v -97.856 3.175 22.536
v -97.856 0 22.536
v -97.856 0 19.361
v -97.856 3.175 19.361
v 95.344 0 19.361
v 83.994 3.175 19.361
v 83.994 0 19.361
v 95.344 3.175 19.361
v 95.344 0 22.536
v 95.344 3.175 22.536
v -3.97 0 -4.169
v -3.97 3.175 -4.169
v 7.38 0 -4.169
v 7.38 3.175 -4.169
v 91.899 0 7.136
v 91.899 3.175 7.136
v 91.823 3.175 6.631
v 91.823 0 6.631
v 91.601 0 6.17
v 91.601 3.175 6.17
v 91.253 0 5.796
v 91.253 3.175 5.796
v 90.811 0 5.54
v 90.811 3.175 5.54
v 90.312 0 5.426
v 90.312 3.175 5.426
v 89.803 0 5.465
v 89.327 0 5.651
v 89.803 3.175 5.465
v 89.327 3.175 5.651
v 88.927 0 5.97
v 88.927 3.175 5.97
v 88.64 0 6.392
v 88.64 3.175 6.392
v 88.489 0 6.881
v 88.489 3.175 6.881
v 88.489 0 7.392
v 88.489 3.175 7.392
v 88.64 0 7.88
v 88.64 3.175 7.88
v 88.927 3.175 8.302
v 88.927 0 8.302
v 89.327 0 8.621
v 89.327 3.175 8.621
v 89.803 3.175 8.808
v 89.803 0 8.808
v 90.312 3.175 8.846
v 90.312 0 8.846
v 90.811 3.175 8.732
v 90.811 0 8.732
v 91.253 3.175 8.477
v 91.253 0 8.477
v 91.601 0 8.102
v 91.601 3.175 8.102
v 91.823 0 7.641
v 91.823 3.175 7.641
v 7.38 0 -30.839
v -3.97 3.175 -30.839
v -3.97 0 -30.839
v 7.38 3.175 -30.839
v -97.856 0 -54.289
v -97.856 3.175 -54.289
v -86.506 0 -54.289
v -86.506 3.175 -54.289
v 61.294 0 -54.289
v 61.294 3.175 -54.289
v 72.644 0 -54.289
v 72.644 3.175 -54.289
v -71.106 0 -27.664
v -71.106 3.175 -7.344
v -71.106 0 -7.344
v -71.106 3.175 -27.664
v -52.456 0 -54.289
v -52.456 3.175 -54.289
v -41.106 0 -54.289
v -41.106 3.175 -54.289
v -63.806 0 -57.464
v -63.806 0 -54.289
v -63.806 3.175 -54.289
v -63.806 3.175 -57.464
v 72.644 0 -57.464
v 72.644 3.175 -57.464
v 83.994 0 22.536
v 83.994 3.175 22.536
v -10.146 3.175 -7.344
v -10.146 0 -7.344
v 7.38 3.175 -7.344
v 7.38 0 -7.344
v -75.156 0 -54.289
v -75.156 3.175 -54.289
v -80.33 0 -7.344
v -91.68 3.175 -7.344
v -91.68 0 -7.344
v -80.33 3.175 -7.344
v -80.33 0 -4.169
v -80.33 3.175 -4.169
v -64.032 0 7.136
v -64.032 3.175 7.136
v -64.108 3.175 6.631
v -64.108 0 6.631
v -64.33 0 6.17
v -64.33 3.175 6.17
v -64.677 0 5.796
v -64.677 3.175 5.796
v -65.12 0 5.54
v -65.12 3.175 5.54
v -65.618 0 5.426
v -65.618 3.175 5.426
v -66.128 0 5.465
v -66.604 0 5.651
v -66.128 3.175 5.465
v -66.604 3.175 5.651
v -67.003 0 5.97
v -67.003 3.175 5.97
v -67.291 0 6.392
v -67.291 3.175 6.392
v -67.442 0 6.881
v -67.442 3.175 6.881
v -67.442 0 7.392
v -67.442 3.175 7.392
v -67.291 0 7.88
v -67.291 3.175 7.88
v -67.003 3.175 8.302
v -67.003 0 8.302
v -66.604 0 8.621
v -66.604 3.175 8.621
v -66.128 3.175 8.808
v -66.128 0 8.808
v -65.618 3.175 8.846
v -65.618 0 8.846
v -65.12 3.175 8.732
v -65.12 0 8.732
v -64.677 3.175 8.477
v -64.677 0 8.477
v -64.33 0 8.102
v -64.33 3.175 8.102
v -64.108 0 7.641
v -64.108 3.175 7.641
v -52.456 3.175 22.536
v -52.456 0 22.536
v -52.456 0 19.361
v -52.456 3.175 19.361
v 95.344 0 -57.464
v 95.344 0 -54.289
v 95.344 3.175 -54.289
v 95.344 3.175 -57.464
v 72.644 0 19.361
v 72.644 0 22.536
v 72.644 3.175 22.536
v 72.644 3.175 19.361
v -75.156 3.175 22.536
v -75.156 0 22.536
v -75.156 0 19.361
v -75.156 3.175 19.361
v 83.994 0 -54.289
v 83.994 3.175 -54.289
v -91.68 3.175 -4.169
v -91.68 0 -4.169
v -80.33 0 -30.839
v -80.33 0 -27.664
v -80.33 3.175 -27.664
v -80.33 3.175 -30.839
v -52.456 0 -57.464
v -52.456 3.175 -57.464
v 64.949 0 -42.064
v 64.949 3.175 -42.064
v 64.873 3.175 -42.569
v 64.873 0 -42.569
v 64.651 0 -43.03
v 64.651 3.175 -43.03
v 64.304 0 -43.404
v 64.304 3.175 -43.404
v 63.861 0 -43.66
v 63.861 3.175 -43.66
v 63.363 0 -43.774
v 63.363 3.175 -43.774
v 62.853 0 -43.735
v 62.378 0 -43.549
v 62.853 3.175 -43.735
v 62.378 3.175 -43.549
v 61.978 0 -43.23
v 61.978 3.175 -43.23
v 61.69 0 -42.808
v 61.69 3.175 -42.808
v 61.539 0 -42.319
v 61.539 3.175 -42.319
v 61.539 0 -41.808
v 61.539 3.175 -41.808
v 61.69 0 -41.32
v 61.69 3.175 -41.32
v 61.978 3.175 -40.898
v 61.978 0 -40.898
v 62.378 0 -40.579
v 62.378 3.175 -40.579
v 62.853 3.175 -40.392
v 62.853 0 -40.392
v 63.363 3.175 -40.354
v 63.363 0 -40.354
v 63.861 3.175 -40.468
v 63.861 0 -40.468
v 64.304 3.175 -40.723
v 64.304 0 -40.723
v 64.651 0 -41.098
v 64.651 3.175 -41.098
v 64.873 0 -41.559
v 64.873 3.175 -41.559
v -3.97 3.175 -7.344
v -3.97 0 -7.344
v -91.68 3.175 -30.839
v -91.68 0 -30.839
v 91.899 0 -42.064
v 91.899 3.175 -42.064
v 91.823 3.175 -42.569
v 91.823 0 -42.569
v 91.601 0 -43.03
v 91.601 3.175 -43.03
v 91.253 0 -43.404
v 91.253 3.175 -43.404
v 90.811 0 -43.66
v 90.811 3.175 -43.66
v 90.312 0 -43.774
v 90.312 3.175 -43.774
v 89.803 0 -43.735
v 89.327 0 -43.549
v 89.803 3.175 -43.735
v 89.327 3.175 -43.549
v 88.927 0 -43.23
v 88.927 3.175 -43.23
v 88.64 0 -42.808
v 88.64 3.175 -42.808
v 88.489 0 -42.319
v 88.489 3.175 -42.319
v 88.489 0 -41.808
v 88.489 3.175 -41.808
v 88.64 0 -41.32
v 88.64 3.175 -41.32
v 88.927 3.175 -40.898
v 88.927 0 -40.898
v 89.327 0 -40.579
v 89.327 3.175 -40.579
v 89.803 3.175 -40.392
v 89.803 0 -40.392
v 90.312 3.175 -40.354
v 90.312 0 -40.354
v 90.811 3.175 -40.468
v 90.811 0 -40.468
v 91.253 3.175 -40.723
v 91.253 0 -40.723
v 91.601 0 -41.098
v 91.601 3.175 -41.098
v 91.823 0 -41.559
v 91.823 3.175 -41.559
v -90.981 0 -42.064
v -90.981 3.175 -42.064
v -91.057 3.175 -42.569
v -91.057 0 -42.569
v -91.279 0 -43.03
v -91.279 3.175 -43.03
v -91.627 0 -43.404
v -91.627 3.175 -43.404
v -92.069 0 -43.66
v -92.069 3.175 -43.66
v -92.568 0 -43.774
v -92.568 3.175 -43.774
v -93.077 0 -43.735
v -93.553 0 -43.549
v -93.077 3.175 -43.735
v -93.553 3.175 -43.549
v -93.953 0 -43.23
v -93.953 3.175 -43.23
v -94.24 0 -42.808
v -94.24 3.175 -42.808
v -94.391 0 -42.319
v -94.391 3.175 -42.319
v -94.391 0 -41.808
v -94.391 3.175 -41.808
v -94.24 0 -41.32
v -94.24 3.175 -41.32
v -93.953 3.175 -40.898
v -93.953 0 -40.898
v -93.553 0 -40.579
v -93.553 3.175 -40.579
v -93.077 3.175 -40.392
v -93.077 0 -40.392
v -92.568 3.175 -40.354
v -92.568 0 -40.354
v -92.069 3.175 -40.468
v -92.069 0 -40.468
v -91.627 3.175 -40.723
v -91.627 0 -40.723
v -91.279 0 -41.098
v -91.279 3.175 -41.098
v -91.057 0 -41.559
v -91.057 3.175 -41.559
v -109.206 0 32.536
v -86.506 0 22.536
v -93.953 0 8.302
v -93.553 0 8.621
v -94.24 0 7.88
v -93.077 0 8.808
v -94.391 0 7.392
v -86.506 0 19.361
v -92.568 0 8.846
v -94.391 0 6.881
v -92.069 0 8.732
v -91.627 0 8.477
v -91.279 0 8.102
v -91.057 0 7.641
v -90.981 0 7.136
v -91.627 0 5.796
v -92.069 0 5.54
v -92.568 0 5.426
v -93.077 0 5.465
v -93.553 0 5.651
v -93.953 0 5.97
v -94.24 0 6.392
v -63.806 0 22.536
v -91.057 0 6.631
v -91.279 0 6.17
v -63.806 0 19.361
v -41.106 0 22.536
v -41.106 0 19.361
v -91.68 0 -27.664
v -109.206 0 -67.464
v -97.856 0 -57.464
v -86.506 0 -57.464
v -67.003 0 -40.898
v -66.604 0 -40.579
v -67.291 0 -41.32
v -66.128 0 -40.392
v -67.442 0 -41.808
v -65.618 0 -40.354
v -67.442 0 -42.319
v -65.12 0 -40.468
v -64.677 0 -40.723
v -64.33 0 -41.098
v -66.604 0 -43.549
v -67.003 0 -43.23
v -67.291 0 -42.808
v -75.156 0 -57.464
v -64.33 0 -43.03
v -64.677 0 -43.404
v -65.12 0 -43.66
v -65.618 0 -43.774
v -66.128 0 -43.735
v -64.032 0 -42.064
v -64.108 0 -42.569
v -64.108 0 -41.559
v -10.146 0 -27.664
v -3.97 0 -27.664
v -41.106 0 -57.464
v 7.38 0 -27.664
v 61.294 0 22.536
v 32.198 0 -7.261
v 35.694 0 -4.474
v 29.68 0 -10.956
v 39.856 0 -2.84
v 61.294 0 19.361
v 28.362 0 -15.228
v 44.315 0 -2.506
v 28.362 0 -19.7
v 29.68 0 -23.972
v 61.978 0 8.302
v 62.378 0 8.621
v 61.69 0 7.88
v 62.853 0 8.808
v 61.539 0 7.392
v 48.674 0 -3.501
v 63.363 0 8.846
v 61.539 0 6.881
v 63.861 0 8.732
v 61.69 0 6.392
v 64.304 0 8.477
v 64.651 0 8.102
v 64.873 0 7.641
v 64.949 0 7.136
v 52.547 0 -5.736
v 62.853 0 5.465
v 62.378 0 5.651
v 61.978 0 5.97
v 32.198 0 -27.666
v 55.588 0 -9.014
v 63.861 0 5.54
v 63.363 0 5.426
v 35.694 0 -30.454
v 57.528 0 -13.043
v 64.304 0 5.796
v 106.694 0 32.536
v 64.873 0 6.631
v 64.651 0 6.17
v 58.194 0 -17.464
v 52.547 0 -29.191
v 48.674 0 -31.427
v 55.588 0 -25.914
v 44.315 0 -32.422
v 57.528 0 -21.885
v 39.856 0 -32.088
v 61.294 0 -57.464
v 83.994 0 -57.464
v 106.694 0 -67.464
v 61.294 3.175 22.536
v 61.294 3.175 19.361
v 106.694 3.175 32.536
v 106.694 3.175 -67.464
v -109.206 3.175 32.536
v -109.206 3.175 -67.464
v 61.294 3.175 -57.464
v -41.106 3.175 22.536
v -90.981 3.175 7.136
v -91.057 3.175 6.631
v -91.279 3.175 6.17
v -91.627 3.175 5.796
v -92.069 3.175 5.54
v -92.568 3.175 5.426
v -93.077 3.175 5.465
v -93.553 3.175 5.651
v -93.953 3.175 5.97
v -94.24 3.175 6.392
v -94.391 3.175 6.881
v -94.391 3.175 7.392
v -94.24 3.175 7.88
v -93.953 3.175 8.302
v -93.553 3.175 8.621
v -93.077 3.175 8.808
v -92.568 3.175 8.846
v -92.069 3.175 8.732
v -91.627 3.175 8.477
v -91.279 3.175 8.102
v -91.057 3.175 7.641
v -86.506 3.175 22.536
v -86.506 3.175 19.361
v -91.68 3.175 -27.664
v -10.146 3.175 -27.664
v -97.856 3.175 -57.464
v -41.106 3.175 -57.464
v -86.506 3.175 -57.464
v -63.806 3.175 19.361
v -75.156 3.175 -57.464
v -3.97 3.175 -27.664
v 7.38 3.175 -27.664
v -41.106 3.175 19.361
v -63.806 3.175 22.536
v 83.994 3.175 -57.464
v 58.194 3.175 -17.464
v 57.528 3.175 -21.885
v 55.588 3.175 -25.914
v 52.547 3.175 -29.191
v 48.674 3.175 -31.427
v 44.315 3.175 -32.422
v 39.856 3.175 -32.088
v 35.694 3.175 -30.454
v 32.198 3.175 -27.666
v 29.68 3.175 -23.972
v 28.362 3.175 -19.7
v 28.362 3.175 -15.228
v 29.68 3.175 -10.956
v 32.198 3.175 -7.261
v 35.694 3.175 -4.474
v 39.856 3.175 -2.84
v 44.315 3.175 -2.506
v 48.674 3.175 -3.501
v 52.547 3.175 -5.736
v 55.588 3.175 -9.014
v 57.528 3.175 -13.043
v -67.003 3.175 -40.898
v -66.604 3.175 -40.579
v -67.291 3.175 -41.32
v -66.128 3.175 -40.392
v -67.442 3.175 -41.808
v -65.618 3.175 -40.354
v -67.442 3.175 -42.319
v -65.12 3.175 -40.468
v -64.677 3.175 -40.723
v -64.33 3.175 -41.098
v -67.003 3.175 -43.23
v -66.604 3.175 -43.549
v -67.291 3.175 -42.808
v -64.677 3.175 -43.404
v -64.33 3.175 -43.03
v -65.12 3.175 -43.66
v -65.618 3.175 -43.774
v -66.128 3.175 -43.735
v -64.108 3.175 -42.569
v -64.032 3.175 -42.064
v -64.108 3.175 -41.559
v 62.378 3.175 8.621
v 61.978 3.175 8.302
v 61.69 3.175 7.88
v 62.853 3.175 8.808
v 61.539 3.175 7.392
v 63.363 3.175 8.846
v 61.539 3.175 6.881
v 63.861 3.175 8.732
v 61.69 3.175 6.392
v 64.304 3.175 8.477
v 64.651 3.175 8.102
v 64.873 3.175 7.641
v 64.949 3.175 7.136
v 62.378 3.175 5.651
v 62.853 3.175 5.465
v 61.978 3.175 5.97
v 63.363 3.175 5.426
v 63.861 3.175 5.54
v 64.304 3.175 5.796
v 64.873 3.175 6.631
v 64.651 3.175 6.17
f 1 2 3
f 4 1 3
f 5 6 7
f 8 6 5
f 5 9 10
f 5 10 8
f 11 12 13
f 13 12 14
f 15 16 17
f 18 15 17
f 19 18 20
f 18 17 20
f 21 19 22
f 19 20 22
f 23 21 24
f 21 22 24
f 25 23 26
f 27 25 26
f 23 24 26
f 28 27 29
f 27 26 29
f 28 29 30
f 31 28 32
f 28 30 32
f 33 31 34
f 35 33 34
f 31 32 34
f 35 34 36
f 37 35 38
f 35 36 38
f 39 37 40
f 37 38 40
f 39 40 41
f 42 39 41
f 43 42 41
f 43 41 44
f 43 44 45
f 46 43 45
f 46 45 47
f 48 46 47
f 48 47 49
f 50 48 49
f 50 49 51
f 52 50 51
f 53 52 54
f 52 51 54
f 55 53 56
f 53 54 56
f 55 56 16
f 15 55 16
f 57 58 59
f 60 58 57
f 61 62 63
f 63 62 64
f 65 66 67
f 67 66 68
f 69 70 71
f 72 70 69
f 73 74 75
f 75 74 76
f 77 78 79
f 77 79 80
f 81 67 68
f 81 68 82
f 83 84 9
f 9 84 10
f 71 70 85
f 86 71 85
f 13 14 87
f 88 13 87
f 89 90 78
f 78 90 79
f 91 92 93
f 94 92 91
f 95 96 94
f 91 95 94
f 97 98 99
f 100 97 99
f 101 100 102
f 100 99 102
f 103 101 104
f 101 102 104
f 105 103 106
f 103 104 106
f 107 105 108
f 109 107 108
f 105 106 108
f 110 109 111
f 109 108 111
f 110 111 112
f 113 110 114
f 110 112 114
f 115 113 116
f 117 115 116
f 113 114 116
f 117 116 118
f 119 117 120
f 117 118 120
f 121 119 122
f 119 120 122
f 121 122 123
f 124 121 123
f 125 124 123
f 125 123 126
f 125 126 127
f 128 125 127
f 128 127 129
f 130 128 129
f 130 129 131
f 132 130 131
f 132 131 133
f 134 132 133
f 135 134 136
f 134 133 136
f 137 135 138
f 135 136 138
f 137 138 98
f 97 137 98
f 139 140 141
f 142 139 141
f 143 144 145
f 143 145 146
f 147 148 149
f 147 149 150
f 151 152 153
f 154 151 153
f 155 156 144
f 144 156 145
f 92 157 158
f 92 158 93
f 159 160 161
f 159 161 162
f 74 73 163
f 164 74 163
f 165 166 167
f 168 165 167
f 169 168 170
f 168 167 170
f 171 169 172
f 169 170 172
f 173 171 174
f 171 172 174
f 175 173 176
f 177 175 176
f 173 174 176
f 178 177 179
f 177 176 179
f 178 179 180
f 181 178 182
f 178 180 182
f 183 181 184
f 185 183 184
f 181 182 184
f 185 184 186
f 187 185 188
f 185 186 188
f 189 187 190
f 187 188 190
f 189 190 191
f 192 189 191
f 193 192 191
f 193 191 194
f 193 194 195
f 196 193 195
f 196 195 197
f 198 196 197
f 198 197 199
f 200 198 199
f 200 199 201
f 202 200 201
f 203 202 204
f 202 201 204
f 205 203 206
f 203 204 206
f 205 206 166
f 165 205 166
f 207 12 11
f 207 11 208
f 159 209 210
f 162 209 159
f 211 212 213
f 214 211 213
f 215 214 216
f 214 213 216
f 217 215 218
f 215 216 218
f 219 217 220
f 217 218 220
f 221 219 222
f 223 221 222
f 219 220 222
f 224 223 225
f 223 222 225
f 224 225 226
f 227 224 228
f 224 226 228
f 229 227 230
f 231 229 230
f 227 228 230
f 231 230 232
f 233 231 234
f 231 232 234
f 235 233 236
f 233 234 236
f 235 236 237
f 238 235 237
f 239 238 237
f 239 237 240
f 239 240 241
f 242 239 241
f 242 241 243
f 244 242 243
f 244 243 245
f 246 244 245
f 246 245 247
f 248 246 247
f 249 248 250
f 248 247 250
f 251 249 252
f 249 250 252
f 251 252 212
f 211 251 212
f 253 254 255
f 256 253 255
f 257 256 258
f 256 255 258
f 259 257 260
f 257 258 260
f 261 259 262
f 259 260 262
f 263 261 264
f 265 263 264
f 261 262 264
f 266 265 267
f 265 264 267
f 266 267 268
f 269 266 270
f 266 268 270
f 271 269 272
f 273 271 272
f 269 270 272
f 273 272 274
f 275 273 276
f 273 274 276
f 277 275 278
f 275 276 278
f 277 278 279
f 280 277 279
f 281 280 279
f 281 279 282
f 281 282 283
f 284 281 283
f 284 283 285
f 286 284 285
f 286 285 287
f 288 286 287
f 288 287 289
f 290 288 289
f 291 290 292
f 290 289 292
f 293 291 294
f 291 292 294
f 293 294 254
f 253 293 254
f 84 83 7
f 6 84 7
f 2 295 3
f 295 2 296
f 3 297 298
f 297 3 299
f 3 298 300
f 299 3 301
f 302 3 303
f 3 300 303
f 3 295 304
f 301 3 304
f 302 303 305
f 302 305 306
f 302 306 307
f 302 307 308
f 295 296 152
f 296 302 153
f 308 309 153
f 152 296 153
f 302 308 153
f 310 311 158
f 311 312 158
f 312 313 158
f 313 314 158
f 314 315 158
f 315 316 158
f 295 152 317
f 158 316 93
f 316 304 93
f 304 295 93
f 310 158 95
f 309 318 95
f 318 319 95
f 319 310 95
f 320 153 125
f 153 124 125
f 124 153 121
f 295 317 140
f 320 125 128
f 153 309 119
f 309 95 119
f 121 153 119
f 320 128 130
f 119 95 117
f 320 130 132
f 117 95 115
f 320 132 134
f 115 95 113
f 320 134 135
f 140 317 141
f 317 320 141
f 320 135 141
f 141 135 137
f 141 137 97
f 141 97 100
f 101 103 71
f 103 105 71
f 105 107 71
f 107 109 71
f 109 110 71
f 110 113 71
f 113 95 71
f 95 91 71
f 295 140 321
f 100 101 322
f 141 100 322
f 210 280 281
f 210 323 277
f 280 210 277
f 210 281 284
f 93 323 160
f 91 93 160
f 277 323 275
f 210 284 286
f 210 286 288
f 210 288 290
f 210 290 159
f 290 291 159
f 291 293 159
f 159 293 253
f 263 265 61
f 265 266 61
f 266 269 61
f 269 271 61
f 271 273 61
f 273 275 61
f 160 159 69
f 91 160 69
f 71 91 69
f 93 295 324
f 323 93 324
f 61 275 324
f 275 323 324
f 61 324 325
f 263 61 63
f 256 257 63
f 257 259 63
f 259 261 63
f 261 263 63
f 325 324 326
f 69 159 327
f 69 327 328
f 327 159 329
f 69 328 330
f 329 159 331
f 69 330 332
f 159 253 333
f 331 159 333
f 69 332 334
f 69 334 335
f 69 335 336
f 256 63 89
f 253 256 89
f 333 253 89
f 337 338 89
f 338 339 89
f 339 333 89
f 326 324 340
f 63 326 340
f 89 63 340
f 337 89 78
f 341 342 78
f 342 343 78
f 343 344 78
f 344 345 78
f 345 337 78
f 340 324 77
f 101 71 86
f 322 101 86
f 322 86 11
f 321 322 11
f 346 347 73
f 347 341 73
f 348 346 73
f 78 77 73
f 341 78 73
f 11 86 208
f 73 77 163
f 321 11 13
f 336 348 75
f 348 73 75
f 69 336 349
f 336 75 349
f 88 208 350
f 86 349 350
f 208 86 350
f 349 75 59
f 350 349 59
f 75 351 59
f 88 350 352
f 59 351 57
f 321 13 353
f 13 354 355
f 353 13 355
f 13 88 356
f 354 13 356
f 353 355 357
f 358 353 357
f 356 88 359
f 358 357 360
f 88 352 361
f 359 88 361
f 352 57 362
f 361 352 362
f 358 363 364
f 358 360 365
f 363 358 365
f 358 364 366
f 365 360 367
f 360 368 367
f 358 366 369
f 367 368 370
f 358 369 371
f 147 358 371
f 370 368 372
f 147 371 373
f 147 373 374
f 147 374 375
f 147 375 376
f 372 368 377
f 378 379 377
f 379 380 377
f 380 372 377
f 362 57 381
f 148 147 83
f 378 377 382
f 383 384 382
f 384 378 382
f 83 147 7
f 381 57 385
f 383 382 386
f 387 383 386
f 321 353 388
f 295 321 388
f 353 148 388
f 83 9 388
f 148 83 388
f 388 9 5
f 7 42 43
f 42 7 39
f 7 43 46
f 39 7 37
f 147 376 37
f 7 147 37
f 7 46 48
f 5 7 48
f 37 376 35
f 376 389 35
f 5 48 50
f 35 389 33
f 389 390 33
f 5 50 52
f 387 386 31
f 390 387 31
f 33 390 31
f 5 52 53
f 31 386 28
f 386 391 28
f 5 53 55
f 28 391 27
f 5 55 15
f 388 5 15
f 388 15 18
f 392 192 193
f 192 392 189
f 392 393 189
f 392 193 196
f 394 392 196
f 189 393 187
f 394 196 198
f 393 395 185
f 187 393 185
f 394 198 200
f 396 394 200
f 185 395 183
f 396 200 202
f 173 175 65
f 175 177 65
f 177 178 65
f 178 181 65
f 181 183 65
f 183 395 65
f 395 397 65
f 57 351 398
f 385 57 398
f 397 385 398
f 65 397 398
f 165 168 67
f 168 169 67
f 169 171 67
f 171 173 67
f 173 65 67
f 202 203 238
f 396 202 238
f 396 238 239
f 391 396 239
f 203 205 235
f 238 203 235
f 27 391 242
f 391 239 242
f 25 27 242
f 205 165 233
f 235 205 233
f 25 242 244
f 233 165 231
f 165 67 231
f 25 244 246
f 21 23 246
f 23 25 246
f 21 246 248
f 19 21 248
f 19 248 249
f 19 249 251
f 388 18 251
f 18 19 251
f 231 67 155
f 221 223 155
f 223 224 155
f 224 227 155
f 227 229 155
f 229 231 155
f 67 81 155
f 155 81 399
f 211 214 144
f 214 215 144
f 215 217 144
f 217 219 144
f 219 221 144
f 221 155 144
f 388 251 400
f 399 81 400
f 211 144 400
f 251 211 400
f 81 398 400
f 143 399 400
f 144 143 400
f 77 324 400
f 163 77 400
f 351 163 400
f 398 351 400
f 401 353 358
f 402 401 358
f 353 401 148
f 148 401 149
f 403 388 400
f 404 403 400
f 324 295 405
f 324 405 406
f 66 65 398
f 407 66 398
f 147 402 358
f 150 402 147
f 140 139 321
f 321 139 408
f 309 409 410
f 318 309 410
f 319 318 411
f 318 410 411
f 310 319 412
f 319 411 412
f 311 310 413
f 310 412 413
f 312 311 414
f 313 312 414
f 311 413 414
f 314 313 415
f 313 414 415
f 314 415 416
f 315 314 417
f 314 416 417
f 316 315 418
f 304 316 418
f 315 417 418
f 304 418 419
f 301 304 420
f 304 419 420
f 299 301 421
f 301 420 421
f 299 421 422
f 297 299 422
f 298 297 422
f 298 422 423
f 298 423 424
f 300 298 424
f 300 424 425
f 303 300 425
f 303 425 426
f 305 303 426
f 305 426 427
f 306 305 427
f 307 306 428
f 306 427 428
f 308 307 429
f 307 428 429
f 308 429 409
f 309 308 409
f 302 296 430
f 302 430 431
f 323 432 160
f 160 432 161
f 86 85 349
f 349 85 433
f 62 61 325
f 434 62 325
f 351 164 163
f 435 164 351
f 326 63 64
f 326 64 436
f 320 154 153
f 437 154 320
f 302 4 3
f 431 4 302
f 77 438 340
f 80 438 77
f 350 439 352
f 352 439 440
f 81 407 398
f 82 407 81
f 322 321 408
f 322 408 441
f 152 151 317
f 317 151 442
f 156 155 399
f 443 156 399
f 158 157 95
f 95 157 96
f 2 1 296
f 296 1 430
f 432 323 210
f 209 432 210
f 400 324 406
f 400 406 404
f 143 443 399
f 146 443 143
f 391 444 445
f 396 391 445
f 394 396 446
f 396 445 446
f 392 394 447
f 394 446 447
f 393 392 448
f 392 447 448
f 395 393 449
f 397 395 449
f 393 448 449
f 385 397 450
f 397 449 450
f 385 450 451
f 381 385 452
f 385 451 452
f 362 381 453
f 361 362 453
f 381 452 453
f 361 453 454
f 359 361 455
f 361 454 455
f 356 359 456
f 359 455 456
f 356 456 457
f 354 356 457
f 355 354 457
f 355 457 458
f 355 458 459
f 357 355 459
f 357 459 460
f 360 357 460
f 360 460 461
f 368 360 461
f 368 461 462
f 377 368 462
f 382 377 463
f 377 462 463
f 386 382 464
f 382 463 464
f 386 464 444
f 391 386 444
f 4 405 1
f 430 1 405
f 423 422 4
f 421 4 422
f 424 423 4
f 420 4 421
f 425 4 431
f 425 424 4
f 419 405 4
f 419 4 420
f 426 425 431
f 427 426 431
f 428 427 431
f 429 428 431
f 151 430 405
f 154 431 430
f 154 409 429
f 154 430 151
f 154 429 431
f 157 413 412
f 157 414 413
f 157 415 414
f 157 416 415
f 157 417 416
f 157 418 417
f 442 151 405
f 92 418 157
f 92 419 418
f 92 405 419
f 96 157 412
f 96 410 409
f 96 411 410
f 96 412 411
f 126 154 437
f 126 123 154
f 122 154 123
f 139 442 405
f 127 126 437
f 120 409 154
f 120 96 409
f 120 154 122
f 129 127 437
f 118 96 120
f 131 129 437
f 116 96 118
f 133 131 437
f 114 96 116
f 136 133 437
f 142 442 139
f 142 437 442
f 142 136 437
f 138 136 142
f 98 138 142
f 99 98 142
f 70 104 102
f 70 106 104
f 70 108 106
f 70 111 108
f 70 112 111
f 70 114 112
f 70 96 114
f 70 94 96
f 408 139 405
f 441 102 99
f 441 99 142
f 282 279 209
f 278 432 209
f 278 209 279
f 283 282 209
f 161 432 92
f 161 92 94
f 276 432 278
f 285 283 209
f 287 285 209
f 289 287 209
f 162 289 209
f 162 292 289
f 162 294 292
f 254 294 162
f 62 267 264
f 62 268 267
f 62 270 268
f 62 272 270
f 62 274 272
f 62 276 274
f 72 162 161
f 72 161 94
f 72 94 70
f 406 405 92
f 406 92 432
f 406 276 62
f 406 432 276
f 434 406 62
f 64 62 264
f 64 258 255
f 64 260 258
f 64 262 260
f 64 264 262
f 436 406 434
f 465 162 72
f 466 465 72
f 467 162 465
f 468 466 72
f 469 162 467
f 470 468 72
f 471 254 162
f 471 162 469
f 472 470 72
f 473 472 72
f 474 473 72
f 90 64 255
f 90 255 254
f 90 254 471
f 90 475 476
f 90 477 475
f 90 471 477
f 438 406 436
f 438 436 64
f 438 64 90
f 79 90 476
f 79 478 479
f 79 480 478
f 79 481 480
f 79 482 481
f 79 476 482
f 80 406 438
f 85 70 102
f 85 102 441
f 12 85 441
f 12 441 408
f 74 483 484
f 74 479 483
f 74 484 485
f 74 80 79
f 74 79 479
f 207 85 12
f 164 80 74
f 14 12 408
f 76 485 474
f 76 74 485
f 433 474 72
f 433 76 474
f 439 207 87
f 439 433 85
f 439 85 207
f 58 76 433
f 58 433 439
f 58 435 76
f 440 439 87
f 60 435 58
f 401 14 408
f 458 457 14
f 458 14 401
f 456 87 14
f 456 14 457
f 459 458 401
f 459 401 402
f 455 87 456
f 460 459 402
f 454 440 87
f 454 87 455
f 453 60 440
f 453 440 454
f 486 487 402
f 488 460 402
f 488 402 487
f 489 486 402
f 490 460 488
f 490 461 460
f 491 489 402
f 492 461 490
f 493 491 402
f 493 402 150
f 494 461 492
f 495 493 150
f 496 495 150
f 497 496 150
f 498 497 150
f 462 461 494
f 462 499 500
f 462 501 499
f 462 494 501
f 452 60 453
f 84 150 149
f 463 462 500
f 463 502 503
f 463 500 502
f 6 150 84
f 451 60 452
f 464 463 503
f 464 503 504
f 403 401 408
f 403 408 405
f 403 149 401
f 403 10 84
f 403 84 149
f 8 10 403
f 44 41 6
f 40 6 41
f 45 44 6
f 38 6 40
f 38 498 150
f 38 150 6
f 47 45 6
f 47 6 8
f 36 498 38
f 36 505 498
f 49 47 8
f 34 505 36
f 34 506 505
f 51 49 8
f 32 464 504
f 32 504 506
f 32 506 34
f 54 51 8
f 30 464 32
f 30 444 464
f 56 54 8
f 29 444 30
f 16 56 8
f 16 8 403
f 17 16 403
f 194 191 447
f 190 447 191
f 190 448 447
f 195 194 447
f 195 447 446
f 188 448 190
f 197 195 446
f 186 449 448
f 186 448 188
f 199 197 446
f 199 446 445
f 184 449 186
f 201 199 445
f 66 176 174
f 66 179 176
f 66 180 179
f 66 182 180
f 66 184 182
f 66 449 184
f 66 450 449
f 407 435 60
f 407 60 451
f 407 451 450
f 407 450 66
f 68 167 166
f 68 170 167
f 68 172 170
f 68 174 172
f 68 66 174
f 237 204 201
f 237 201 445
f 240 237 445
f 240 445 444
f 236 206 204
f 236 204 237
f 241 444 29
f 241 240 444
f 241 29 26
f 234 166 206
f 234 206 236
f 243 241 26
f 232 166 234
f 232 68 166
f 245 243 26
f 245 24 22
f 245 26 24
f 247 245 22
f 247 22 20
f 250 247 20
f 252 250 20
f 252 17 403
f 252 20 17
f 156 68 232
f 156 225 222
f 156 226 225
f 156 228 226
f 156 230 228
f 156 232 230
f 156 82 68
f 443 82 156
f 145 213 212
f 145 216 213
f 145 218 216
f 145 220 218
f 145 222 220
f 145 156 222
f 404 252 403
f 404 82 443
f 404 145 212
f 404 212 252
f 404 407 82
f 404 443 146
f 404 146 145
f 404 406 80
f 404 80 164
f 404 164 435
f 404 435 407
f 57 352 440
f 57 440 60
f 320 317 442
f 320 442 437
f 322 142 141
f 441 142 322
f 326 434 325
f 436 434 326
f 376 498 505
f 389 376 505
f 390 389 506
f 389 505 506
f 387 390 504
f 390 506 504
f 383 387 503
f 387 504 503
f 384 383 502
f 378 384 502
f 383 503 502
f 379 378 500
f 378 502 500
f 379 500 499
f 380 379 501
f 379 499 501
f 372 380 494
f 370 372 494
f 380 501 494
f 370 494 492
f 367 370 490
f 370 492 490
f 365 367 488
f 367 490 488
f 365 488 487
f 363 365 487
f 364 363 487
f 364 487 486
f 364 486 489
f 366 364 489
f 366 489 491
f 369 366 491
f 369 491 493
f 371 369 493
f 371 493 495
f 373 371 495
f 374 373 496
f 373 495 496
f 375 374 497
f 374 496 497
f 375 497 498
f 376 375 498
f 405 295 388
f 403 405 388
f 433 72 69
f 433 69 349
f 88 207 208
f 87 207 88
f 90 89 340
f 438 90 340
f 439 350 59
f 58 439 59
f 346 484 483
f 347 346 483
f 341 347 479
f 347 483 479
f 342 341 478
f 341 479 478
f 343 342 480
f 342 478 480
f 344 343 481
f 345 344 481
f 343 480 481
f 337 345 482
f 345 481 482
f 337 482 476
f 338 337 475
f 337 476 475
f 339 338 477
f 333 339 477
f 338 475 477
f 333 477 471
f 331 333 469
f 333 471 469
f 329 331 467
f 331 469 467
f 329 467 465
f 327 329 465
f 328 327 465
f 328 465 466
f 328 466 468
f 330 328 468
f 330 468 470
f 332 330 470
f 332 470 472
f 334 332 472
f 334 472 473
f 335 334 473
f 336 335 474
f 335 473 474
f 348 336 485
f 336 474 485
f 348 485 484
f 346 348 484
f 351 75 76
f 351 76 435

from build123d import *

# Parameters (mm, degrees)
SKETCH1_W               = 215.9
SKETCH1_H               = 100
BOSS_EXTRUDE1_DEPTH     = 3.175
SKETCH3_W               = 11.35
SKETCH3_H               = 3.175
CUT_EXTRUDE2_DEPTH      = 3.175
SKETCH4_W               = 11.35
SKETCH4_H               = 3.175
CUT_EXTRUDE3_DEPTH      = 3.175
SKETCH5_W               = 60.96
SKETCH5_H               = 20.32
CUT_EXTRUDE4_DEPTH      = 1
CUT_EXTRUDE4_DEPTH_BACK = 3.175
SKETCH6_R               = 1.7145
CUT_EXTRUDE5_DEPTH      = 3.175
SKETCH7_R               = 15
CUT_EXTRUDE6_DEPTH      = 3.175
SKETCH8_W               = 11.35
SKETCH8_H               = 3.175
CUT_EXTRUDE7_DEPTH      = 3.175


with BuildPart() as part:
    # Sketch1 → Boss-Extrude1 (new body)
    with BuildSketch(Plane(origin=(0, 0, 0), x_dir=(1, 0, 0), z_dir=(0, 1, 0))):
        with Locations((-1.255776173, 17.463898917)):
            Rectangle(SKETCH1_W, SKETCH1_H)
    extrude(amount=BOSS_EXTRUDE1_DEPTH)

    # Sketch3 → Cut-Extrude2 (cut)
    with BuildSketch(Plane(origin=(0, 3.175, 0), x_dir=(1, 0, 0), z_dir=(0, 1, 0))):
        with Locations((-92.180776173, 55.876398917)):
            Rectangle(SKETCH3_W, SKETCH3_H)
        with Locations((-46.780776173, 55.876398917)):
            Rectangle(SKETCH3_W, SKETCH3_H)
        with Locations((-69.480776173, 55.876398917)):
            Rectangle(SKETCH3_W, SKETCH3_H)
        with Locations((66.969233827, 55.876398917)):
            Rectangle(SKETCH3_W, SKETCH3_H)
        with Locations((89.669223827, 55.876398917)):
            Rectangle(SKETCH3_W, SKETCH3_H)
    extrude(amount=-CUT_EXTRUDE2_DEPTH, mode=Mode.SUBTRACT)

    # Sketch4 → Cut-Extrude3 (cut)
    with BuildSketch(Plane(origin=(0, 3.175, 0), x_dir=(1, 0, 0), z_dir=(0, 1, 0))):
        with Locations((-92.180776173, -20.948601083)):
            Rectangle(SKETCH4_W, SKETCH4_H)
        with Locations((-69.480776173, -20.948601083)):
            Rectangle(SKETCH4_W, SKETCH4_H)
        with Locations((-46.780776173, -20.948601083)):
            Rectangle(SKETCH4_W, SKETCH4_H)
        with Locations((66.969233827, -20.948601083)):
            Rectangle(SKETCH4_W, SKETCH4_H)
        with Locations((89.669223827, -20.948601083)):
            Rectangle(SKETCH4_W, SKETCH4_H)
    extrude(amount=-CUT_EXTRUDE3_DEPTH, mode=Mode.SUBTRACT)

    # Sketch5 → Cut-Extrude4 (cut, two sides)
    with BuildSketch(Plane(origin=(0, 3.175, 0), x_dir=(1, 0, 0), z_dir=(0, 1, 0))) as cut_extrude4_sk:
        with Locations((-40.625776173, 17.503898917)):
            Rectangle(SKETCH5_W, SKETCH5_H)
    extrude(amount=CUT_EXTRUDE4_DEPTH, mode=Mode.SUBTRACT)
    extrude(cut_extrude4_sk.sketch, amount=-CUT_EXTRUDE4_DEPTH_BACK, mode=Mode.SUBTRACT)

    # Sketch6 → Cut-Extrude5 (cut)
    with BuildSketch(Plane(origin=(0, 3.175, 0), x_dir=(1, 0, 0), z_dir=(0, 1, 0))):
        with Locations((-92.695776173, 42.063898917)):
            Circle(SKETCH6_R)
        with Locations((-65.746376173, 42.063898917)):
            Circle(SKETCH6_R)
        with Locations((-92.695776173, -7.136101083)):
            Circle(SKETCH6_R)
        with Locations((-65.746376173, -7.136101083)):
            Circle(SKETCH6_R)
        with Locations((63.234823827, 42.063898917)):
            Circle(SKETCH6_R)
        with Locations((90.184223827, 42.063898917)):
            Circle(SKETCH6_R)
        with Locations((63.234823827, -7.136101083)):
            Circle(SKETCH6_R)
        with Locations((90.184223827, -7.136101083)):
            Circle(SKETCH6_R)
    extrude(amount=-CUT_EXTRUDE5_DEPTH, mode=Mode.SUBTRACT)

    # Sketch7 → Cut-Extrude6 (cut)
    with BuildSketch(Plane(origin=(0, 3.175, 0), x_dir=(1, 0, 0), z_dir=(0, 1, 0))):
        with Locations((43.194223827, 17.463898917)):
            Circle(SKETCH7_R)
    extrude(amount=-CUT_EXTRUDE6_DEPTH, mode=Mode.SUBTRACT)

    # Sketch8 → Cut-Extrude7 (cut)
    with BuildSketch(Plane(origin=(0, 3.175, 0), x_dir=(1, 0, 0), z_dir=(0, 1, 0))):
        with Locations((-86.004776173, 5.756398917)):
            Rectangle(SKETCH8_W, SKETCH8_H)
        with Locations((-86.004776173, 29.251398917)):
            Rectangle(SKETCH8_W, SKETCH8_H)
        with Locations((1.705223827, 5.756398917)):
            Rectangle(SKETCH8_W, SKETCH8_H)
        with Locations((1.705223827, 29.251398917)):
            Rectangle(SKETCH8_W, SKETCH8_H)
    extrude(amount=-CUT_EXTRUDE7_DEPTH, mode=Mode.SUBTRACT)


solid = part.part
